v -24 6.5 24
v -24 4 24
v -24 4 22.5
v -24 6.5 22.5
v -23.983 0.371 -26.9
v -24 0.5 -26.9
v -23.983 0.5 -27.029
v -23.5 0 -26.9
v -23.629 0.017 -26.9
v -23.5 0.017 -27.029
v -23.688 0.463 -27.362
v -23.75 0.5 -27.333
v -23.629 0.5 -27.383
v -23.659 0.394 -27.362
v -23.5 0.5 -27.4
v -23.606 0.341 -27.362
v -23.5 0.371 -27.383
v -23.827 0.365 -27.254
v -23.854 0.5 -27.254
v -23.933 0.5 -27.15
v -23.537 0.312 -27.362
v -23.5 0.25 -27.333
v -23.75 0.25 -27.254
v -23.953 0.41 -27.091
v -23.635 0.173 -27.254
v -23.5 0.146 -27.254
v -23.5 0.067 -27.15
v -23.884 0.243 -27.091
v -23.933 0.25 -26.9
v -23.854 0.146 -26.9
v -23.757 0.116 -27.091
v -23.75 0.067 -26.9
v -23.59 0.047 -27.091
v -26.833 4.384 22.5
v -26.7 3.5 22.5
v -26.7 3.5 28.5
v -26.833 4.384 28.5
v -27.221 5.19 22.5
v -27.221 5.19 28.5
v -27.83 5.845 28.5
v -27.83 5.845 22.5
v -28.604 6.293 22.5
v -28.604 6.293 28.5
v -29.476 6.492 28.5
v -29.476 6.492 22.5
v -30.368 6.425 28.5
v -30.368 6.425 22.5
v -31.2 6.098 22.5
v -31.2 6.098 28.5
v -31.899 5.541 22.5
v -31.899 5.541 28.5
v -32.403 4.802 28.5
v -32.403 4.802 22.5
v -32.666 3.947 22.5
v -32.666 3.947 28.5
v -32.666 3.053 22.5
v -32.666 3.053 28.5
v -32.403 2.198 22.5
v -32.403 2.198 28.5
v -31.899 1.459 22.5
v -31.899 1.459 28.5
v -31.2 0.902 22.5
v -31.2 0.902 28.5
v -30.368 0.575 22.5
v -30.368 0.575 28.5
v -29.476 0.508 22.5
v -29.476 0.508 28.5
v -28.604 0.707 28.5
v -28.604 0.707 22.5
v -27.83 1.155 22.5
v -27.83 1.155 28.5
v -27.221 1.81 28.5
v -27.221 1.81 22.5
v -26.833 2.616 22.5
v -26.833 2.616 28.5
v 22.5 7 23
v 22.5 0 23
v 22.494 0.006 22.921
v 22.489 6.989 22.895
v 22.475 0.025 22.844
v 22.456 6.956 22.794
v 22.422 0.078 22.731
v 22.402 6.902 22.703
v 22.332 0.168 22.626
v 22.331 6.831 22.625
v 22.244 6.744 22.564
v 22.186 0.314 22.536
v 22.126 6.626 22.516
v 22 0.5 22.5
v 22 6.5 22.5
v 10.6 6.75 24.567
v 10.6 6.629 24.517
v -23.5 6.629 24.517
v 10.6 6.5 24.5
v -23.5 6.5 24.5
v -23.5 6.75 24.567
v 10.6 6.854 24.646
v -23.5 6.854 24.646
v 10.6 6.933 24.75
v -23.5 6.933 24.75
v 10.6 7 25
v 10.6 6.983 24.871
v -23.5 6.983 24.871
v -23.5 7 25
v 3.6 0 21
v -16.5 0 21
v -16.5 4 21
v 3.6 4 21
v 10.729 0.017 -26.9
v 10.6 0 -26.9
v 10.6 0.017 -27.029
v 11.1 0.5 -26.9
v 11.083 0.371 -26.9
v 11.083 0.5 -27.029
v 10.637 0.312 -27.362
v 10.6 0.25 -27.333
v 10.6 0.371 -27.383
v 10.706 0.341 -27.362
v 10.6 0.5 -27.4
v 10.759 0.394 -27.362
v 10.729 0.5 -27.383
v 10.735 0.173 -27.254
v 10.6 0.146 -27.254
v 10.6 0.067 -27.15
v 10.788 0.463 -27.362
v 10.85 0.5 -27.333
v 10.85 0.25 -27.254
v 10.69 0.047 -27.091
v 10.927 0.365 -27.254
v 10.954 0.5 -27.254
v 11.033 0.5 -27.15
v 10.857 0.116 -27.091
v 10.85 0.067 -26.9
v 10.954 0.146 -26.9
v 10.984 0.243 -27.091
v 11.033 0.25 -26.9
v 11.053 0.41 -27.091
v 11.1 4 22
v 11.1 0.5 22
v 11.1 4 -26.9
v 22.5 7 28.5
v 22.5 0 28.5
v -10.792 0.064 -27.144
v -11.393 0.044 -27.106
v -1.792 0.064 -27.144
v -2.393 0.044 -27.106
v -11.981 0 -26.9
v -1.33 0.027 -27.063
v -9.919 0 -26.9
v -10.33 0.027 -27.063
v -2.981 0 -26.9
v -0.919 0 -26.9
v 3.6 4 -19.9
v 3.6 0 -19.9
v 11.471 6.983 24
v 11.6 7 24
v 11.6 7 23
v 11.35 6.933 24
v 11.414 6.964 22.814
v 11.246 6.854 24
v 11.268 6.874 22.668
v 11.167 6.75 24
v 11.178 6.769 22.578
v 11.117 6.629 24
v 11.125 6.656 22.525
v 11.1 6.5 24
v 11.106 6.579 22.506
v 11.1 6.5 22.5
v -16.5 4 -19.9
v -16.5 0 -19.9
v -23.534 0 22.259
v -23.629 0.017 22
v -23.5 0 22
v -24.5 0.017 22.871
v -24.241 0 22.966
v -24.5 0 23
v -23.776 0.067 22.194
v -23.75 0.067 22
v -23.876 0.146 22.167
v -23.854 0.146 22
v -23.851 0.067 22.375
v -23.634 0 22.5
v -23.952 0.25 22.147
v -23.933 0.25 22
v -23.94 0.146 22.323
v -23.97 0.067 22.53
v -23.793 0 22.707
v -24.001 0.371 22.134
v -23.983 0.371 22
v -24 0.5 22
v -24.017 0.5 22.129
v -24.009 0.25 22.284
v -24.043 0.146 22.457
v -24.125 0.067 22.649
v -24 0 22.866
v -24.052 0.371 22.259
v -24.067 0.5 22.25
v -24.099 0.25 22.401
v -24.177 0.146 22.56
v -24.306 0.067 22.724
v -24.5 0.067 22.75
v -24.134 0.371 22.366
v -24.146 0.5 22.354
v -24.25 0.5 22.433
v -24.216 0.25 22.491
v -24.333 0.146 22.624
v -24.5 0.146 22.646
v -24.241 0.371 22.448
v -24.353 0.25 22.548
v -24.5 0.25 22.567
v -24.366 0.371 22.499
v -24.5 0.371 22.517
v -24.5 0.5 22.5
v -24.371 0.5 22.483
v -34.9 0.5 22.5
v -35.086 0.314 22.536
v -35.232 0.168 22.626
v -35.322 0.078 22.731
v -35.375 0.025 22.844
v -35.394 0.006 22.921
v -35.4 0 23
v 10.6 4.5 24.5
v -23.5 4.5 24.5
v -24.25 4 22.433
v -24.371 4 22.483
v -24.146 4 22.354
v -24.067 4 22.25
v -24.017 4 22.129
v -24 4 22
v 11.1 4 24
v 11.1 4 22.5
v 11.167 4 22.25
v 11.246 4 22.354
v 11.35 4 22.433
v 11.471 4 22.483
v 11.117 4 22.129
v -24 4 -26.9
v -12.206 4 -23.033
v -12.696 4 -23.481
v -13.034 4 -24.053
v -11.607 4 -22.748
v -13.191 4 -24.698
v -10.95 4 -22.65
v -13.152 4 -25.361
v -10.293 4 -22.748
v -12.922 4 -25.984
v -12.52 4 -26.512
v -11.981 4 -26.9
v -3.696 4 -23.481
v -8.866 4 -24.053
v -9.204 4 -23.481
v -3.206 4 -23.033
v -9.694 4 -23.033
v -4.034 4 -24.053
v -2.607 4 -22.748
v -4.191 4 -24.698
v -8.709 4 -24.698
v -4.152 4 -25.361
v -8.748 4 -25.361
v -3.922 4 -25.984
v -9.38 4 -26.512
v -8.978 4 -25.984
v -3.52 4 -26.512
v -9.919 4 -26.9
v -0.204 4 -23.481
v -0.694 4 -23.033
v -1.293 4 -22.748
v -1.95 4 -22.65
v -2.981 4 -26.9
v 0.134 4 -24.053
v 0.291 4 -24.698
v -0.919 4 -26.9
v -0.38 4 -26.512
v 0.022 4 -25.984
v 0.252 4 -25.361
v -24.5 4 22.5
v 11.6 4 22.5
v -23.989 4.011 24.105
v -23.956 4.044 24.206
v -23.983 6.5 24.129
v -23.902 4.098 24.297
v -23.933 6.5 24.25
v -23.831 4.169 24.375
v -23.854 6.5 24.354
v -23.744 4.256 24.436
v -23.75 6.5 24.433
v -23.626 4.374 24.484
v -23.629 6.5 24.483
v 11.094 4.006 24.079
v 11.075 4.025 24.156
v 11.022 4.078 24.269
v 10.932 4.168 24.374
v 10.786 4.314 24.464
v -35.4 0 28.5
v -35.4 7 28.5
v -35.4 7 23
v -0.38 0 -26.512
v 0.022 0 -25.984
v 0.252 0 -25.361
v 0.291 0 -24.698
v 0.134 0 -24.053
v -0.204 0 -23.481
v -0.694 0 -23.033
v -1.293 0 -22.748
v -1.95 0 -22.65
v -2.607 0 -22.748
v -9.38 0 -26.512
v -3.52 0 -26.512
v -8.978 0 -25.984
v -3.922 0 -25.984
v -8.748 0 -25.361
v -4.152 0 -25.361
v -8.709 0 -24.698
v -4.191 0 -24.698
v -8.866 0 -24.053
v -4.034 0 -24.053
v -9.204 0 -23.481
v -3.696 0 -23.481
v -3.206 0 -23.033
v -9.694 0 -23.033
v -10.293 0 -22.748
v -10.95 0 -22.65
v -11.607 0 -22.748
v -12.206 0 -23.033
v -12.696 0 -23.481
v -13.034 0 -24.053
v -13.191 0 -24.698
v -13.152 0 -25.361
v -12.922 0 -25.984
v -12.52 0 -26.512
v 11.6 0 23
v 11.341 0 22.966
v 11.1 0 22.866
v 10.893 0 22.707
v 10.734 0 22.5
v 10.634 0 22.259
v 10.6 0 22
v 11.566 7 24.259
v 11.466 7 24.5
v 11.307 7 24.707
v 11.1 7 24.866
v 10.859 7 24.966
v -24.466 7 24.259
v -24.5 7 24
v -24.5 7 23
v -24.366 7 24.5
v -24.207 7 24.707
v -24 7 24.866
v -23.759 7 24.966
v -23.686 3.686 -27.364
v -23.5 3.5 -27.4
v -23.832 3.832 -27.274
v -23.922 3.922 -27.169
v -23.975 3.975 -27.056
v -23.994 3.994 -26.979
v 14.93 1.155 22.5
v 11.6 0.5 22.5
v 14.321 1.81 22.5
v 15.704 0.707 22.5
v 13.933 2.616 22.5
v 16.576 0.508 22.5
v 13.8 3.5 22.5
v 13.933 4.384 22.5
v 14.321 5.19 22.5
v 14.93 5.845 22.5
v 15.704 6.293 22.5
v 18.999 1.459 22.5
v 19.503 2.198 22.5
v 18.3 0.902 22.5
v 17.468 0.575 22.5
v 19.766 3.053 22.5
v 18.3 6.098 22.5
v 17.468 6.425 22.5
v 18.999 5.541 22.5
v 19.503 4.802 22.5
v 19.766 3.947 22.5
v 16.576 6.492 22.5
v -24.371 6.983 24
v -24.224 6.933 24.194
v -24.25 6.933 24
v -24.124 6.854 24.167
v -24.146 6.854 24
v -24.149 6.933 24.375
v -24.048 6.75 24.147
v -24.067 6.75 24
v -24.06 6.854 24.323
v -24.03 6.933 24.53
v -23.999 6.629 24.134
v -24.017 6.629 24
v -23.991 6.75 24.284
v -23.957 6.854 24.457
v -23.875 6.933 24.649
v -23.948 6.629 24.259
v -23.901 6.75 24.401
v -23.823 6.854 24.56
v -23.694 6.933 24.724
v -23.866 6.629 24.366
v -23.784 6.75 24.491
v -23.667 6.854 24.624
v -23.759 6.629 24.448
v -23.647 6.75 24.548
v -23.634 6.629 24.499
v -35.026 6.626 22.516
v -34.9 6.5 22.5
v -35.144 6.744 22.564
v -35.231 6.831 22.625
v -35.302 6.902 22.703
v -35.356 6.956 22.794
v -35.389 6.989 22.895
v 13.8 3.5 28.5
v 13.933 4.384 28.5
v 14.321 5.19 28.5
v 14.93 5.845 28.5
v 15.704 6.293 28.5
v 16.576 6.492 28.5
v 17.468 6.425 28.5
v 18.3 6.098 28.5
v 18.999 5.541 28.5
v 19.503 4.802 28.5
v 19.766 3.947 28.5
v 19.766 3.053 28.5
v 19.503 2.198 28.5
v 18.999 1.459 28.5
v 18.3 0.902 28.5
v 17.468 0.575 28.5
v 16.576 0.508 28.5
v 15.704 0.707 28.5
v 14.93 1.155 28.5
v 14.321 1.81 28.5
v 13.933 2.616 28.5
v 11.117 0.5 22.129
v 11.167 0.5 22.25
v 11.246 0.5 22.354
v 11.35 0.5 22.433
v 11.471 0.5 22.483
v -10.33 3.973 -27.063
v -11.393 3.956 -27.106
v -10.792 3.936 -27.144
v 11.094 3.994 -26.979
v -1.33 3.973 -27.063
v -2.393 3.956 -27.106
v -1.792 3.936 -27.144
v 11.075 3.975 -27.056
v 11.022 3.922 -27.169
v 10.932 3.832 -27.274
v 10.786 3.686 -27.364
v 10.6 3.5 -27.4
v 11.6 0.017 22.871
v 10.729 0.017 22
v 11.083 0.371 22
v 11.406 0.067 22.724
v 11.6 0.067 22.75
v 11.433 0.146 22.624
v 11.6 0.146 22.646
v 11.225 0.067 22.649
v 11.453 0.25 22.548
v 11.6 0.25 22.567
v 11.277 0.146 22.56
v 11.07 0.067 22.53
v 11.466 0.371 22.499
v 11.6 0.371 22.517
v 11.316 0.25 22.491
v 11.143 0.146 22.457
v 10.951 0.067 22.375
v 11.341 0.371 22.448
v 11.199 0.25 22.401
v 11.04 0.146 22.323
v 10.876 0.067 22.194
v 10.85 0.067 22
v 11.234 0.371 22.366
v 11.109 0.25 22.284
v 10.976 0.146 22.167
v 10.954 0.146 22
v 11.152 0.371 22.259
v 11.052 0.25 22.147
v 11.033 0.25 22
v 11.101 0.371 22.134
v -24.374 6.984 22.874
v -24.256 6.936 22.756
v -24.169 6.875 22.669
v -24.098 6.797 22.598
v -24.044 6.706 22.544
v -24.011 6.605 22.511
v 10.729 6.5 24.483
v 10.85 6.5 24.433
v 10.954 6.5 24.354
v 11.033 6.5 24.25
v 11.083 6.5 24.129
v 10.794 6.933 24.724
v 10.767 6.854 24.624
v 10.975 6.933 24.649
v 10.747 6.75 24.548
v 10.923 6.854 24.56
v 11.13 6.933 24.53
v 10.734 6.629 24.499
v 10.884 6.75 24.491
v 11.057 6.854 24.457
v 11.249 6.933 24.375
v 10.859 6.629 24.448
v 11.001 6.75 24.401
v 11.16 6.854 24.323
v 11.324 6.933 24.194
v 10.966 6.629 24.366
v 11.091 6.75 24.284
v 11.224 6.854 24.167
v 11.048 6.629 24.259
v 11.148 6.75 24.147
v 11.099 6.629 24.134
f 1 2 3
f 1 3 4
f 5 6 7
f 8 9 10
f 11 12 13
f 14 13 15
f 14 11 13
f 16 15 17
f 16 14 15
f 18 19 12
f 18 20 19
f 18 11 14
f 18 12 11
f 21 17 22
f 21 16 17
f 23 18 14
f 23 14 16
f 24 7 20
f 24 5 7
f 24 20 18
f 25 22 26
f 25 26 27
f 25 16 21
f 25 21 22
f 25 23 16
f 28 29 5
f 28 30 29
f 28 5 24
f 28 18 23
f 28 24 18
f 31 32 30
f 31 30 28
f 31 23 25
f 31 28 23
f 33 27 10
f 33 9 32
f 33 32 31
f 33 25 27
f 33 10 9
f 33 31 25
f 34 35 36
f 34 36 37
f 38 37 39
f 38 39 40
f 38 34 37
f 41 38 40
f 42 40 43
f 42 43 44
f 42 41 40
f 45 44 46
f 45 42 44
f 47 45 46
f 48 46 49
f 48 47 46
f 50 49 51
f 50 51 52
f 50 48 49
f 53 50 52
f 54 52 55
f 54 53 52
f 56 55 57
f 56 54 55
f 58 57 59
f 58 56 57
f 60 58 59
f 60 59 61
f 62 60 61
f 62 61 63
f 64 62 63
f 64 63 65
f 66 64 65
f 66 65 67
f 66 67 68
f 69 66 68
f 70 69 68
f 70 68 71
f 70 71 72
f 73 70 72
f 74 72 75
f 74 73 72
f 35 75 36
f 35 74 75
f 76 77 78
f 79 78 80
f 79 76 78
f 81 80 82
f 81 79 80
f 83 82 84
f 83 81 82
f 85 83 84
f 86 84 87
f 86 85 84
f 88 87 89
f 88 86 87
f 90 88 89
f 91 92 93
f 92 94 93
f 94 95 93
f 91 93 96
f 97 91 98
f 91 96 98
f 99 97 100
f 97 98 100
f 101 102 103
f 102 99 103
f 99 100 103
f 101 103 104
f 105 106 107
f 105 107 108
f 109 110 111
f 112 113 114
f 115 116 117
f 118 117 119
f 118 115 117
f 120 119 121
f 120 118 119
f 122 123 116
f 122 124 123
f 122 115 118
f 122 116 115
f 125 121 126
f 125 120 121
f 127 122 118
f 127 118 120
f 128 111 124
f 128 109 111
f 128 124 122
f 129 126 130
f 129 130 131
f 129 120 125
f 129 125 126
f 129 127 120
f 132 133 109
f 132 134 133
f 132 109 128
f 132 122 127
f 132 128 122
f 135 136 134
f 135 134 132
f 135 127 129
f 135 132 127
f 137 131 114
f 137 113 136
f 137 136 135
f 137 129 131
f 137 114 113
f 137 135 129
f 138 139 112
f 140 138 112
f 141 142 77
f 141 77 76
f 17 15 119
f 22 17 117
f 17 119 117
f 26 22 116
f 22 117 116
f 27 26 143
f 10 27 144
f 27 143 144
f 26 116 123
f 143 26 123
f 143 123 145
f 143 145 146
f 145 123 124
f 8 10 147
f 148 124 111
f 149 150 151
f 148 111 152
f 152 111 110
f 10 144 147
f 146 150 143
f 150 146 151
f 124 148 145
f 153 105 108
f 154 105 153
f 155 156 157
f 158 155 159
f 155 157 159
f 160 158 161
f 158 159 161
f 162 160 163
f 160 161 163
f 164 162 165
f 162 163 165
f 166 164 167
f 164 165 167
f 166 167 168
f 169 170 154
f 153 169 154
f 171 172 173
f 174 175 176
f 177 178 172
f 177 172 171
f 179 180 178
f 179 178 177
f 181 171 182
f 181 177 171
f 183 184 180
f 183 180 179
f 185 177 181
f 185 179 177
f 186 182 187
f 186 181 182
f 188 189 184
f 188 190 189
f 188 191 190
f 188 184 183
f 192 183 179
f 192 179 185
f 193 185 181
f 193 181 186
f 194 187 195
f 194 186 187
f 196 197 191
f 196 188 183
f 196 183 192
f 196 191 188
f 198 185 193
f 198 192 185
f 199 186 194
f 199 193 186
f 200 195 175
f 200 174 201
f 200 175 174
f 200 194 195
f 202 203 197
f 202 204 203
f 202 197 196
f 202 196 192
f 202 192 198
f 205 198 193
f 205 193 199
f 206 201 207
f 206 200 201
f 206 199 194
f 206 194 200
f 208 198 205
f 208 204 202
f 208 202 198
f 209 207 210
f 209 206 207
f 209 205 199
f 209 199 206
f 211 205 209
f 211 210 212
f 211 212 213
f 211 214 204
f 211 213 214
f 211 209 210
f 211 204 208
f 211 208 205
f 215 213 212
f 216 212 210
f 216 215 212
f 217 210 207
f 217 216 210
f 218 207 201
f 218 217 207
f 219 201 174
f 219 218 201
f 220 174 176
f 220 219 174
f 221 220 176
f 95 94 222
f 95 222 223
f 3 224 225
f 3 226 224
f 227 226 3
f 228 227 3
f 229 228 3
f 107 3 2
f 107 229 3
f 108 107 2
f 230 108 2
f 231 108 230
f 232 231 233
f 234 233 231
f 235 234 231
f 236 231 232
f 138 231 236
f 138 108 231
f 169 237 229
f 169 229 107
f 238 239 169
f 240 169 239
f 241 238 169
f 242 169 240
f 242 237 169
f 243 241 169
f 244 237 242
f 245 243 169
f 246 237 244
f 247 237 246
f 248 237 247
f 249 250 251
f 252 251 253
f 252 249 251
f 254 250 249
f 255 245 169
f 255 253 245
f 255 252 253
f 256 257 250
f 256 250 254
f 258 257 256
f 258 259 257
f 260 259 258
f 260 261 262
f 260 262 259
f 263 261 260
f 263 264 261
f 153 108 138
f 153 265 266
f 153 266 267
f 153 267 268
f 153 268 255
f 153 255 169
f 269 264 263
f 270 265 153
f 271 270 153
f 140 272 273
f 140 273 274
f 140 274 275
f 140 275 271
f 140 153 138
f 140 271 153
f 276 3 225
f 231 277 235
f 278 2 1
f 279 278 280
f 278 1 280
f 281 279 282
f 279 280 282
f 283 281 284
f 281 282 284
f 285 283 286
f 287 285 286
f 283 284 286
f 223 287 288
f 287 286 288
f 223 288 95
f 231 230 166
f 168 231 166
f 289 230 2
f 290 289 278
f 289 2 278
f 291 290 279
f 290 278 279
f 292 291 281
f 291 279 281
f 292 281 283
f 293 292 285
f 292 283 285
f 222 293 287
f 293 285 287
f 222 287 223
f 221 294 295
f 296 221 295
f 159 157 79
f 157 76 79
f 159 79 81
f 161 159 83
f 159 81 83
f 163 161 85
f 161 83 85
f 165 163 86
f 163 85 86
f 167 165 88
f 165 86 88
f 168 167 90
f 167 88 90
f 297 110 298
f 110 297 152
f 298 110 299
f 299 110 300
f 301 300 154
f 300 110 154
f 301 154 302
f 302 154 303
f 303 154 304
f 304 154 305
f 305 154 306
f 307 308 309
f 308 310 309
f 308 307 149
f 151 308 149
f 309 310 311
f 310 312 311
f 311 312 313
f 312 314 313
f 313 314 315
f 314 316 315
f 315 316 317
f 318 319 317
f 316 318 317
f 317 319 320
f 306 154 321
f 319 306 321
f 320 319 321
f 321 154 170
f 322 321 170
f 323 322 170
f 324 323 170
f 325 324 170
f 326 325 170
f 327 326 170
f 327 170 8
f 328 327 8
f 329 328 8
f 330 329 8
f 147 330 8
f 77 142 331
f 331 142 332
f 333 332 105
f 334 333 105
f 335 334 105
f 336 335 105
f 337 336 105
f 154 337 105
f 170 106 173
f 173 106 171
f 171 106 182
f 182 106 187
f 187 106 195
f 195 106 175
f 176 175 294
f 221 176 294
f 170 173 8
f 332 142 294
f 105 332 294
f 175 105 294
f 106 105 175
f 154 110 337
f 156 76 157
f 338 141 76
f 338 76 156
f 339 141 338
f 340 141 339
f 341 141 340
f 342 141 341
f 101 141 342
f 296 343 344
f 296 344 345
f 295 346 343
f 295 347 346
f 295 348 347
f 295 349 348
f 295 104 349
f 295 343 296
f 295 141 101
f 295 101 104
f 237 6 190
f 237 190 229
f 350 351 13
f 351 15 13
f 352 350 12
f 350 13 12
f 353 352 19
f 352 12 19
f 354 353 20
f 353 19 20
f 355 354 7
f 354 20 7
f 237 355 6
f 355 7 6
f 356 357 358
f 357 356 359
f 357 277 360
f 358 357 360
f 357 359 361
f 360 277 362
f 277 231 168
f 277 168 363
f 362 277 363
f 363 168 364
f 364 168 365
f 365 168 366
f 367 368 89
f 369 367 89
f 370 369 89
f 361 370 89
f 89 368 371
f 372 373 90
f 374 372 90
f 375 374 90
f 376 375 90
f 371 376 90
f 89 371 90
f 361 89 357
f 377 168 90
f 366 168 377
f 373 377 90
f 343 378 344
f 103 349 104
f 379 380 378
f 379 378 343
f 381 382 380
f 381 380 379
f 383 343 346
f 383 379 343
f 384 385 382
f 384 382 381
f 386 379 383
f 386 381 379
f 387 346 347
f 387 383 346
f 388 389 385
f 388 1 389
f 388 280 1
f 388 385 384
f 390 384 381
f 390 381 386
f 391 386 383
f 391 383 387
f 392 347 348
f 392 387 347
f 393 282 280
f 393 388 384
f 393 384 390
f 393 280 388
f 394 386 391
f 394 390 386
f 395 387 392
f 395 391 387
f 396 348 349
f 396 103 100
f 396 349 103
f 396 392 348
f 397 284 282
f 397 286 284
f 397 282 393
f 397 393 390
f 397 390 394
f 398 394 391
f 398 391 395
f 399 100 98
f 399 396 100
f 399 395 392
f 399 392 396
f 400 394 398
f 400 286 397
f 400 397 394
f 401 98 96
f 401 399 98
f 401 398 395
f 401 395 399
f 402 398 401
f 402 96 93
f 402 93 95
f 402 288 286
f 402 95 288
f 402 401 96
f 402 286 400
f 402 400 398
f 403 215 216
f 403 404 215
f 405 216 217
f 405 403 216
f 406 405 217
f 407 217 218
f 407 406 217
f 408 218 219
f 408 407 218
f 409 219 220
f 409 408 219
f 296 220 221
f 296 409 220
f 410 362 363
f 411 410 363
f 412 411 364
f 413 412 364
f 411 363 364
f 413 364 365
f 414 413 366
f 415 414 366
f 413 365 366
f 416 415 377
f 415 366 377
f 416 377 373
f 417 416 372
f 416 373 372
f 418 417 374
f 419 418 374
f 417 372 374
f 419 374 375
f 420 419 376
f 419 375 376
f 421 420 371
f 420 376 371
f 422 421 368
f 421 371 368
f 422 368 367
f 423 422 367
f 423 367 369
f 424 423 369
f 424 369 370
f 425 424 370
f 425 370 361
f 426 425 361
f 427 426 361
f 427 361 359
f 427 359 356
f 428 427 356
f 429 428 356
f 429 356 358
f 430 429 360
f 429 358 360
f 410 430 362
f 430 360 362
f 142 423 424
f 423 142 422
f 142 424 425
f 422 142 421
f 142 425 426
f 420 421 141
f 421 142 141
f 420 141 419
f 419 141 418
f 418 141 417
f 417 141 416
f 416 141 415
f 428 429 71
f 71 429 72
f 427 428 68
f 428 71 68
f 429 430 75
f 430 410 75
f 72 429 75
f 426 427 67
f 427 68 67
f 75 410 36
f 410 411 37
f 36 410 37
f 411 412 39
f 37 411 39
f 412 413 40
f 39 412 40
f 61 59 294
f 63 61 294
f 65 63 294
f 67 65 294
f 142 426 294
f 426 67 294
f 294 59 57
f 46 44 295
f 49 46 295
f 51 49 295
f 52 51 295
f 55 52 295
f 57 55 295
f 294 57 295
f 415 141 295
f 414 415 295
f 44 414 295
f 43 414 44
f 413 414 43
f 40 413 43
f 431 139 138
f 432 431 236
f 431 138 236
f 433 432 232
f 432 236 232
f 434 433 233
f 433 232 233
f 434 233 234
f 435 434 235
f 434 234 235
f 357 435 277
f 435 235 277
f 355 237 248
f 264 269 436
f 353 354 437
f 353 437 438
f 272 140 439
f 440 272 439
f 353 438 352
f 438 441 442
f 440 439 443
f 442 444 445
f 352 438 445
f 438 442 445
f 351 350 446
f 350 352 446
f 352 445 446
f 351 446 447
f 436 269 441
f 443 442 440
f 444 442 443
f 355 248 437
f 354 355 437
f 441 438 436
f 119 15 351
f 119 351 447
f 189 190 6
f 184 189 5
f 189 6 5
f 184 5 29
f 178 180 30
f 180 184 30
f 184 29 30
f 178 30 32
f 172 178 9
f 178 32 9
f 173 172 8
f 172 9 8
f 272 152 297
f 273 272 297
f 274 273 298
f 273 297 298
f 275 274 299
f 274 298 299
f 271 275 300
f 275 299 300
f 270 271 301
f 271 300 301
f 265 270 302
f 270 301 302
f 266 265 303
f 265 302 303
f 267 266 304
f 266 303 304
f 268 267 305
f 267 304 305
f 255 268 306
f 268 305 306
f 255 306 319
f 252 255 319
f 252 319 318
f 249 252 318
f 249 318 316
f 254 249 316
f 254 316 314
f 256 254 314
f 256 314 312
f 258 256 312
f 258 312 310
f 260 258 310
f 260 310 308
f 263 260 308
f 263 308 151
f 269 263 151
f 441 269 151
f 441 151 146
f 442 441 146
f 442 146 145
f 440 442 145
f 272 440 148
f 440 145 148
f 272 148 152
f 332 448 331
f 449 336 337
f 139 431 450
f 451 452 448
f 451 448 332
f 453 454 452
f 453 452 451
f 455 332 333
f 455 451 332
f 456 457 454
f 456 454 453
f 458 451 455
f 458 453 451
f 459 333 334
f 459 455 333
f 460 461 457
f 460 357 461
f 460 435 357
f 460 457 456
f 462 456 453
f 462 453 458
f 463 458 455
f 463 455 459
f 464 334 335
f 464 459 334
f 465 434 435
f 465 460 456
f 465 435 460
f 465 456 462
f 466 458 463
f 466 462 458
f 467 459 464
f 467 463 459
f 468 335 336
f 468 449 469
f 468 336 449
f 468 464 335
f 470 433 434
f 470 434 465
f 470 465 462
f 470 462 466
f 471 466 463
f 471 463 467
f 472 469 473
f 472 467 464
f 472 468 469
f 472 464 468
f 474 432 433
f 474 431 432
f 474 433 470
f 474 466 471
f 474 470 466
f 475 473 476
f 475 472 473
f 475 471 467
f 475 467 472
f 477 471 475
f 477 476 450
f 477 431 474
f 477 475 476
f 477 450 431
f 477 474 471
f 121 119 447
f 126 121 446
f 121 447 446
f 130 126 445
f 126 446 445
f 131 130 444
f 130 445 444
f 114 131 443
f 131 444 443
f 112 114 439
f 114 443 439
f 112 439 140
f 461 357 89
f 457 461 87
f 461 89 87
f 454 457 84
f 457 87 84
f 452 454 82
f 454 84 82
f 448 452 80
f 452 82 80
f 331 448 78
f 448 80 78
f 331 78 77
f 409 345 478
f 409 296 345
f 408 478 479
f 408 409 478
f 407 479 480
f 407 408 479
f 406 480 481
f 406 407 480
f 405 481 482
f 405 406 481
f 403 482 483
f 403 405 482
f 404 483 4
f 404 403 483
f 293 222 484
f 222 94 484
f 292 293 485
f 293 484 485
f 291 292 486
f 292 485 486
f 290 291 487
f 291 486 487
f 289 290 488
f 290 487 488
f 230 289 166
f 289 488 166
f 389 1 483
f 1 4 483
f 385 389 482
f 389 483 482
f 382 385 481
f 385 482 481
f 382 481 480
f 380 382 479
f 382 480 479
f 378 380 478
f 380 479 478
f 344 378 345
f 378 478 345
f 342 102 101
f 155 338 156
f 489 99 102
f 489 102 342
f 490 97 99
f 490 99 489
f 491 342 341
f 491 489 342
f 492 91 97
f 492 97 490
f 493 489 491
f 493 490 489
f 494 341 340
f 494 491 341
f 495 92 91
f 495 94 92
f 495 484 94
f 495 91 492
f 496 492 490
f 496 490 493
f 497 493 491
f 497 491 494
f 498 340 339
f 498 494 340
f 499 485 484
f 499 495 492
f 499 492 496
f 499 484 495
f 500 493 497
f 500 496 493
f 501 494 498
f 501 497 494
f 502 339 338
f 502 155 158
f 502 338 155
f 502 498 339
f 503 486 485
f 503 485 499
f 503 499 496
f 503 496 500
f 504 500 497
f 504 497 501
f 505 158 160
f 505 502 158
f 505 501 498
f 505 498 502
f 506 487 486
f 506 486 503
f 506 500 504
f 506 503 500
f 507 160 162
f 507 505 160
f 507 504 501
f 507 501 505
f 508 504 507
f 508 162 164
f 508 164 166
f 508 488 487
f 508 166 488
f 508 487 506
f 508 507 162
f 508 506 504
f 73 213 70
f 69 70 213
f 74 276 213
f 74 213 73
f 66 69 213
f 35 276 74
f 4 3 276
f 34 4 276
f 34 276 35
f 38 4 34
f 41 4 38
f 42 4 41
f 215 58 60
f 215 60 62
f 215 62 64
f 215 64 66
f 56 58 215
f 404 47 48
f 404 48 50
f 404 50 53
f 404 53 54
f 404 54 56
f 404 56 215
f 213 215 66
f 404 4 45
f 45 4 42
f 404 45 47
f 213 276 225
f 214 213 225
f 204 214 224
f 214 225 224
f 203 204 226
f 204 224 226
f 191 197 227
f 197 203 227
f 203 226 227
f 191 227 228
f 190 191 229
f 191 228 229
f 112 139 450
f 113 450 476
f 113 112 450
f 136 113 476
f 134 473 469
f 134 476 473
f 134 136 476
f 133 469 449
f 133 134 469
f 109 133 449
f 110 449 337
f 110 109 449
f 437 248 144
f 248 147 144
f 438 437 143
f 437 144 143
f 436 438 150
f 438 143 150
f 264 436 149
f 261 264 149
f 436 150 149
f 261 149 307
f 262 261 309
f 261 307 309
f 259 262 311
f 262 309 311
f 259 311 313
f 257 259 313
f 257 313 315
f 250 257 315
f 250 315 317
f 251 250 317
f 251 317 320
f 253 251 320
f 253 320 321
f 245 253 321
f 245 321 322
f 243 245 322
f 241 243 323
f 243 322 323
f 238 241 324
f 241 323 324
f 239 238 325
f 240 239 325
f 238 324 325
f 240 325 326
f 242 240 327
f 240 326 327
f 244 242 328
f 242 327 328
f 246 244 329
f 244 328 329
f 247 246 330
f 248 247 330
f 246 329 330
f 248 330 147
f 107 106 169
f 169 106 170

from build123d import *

# Parameters (mm, degrees)
ESQUISSE1_W             = 35.1
ESQUISSE1_H             = 55.9
ESQUISSE1_W_2           = 20.1
ESQUISSE1_H_2           = 40.9
BOSS_EXTRU_1_DEPTH      = 4
ESQUISSE5_W             = 17.55
ESQUISSE5_H             = 3
BOSS_EXTRU_2_DEPTH      = 4
ESQUISSE7_W             = 11.4
ESQUISSE7_H             = 7
BOSS_EXTRU_3_DEPTH      = 6
ESQUISSE8_R             = 3
ENL_V_MAT_EXTRU_1_DEPTH = 6
CONG_1_R                = 0.5
CONG_2_R                = 0.5
ENL_V_MAT_EXTRU_2_REACH = 47.983
ESQUISSE9_R             = 2.25


with BuildPart() as part:
    # Esquisse1 → Boss.-Extru.1 (new body)
    with BuildSketch(Plane(origin=(0, 0, 0), x_dir=(1, 0, 0), z_dir=(0, 1, 0))):
        with Locations((-6.45, -0.55)):
            Rectangle(ESQUISSE1_W, ESQUISSE1_H)
        with Locations((-6.45, -0.55)):
            Rectangle(ESQUISSE1_W_2, ESQUISSE1_H_2, mode=Mode.SUBTRACT)
    extrude(amount=BOSS_EXTRU_1_DEPTH)

    # Esquisse5 → Boss.-Extru.2 (add)
    with BuildSketch(Plane.XY.offset(28.5)):
        with Locations((2.325, 5.5)):
            Rectangle(ESQUISSE5_W, ESQUISSE5_H)
    boss_extru_2 = extrude(amount=-BOSS_EXTRU_2_DEPTH)

    # Symétrie1: Boss.-Extru.2 across plane
    add(boss_extru_2.mirror(Plane(origin=(-6.45, 0, 0), x_dir=(0, 0, 1), z_dir=(1, 0, 0))))

    # Esquisse7 → Boss.-Extru.3 (add)
    with BuildSketch(Plane.XY.offset(28.5)):
        with Locations((16.8, 3.5)):
            Rectangle(ESQUISSE7_W, ESQUISSE7_H)
    boss_extru_3 = extrude(amount=-BOSS_EXTRU_3_DEPTH)

    # Esquisse8 → Enlèv. mat.-Extru.1 (cut)
    with BuildSketch(Plane(origin=(0, 0, 22.5), x_dir=(-1, 0, 0), z_dir=(0, 0, -1))):
        with Locations((-16.8, 3.5)):
            Circle(ESQUISSE8_R)
    enl_v_mat_extru_1 = extrude(amount=-ENL_V_MAT_EXTRU_1_DEPTH, mode=Mode.SUBTRACT)

    # Symétrie2: Boss.-Extru.3 across plane
    add(boss_extru_3.mirror(Plane(origin=(-6.45, 0, 0), x_dir=(0, 0, 1), z_dir=(1, 0, 0))))

    # Symétrie3: Enlèv. mat.-Extru.1 across plane
    add(enl_v_mat_extru_1.mirror(Plane(origin=(-6.45, 0, 0), x_dir=(0, 0, 1), z_dir=(1, 0, 0))), mode=Mode.SUBTRACT)

    # Congé1
    cong_1_edges = [part.edges().sort_by_distance(p)[0] for p in [
        (11.1, 7, 23.5),
        (-24, 7, 23.5),
        (-24, 0, -2.45),
        (11.1, 0, -2.45),
        (11.1, 5.5, 24.5),
        (-6.45, 7, 24.5),
        (-24, 5.5, 24.5),
        (-6.45, 4, 24.5),
        (-29.7, 7, 22.5),
        (-35.4, 3.5, 22.5),
        (-29.7, 0, 22.5),
        (-24, 2, 22.5),
        (11.1, 2, 22.5),
        (16.8, 0, 22.5),
        (22.5, 3.5, 22.5),
        (16.8, 7, 22.5),
    ]]
    fillet(cong_1_edges, radius=CONG_1_R - 0.0001)  # a hair under: the kernel refuses the full size

    # Congé2
    cong_2_edges = [part.edges().sort_by_distance(p)[0] for p in [
        (-6.45, 0, -27.4),
        (10.95358268, 0.14641732, -27.4),
        (-23.85358268, 0.14641732, -27.4),
        (-6.45, 4, -27.4),
        (11.1, 2.24995, -27.4),
        (-24, 2.24995, -27.4),
    ]]
    fillet(cong_2_edges, radius=CONG_2_R - 0.0001)  # a hair under: the kernel refuses the full size

    # Esquisse9 → Enlèv. mat.-Extru.2 (cut, up to next)
    with BuildSketch(Plane.XZ, mode=Mode.PRIVATE) as enl_v_mat_extru_2_sk1:
        with Locations(Location((-1.95, -24.9, 0), (0, 0, 297.266044451))):
            Circle(ESQUISSE9_R)
    enl_v_mat_extru_2_tool1 = extrude(enl_v_mat_extru_2_sk1.sketch, amount=-ENL_V_MAT_EXTRU_2_REACH, mode=Mode.PRIVATE) & part.part
    # Esquisse9 → Enlèv. mat.-Extru.2 (cut, up to next)
    with BuildSketch(Plane.XZ, mode=Mode.PRIVATE) as enl_v_mat_extru_2_sk2:
        with Locations(Location((-10.95, -24.9, 0), (0, 0, 242.733955549))):
            Circle(ESQUISSE9_R)
    enl_v_mat_extru_2_tool2 = extrude(enl_v_mat_extru_2_sk2.sketch, amount=-ENL_V_MAT_EXTRU_2_REACH, mode=Mode.PRIVATE) & part.part
    add(enl_v_mat_extru_2_tool1.solids().sort_by_distance((-1.95, 0, -24.9))[0], mode=Mode.SUBTRACT)
    add(enl_v_mat_extru_2_tool2.solids().sort_by_distance((-10.95, 0, -24.9))[0], mode=Mode.SUBTRACT)


solid = part.part
